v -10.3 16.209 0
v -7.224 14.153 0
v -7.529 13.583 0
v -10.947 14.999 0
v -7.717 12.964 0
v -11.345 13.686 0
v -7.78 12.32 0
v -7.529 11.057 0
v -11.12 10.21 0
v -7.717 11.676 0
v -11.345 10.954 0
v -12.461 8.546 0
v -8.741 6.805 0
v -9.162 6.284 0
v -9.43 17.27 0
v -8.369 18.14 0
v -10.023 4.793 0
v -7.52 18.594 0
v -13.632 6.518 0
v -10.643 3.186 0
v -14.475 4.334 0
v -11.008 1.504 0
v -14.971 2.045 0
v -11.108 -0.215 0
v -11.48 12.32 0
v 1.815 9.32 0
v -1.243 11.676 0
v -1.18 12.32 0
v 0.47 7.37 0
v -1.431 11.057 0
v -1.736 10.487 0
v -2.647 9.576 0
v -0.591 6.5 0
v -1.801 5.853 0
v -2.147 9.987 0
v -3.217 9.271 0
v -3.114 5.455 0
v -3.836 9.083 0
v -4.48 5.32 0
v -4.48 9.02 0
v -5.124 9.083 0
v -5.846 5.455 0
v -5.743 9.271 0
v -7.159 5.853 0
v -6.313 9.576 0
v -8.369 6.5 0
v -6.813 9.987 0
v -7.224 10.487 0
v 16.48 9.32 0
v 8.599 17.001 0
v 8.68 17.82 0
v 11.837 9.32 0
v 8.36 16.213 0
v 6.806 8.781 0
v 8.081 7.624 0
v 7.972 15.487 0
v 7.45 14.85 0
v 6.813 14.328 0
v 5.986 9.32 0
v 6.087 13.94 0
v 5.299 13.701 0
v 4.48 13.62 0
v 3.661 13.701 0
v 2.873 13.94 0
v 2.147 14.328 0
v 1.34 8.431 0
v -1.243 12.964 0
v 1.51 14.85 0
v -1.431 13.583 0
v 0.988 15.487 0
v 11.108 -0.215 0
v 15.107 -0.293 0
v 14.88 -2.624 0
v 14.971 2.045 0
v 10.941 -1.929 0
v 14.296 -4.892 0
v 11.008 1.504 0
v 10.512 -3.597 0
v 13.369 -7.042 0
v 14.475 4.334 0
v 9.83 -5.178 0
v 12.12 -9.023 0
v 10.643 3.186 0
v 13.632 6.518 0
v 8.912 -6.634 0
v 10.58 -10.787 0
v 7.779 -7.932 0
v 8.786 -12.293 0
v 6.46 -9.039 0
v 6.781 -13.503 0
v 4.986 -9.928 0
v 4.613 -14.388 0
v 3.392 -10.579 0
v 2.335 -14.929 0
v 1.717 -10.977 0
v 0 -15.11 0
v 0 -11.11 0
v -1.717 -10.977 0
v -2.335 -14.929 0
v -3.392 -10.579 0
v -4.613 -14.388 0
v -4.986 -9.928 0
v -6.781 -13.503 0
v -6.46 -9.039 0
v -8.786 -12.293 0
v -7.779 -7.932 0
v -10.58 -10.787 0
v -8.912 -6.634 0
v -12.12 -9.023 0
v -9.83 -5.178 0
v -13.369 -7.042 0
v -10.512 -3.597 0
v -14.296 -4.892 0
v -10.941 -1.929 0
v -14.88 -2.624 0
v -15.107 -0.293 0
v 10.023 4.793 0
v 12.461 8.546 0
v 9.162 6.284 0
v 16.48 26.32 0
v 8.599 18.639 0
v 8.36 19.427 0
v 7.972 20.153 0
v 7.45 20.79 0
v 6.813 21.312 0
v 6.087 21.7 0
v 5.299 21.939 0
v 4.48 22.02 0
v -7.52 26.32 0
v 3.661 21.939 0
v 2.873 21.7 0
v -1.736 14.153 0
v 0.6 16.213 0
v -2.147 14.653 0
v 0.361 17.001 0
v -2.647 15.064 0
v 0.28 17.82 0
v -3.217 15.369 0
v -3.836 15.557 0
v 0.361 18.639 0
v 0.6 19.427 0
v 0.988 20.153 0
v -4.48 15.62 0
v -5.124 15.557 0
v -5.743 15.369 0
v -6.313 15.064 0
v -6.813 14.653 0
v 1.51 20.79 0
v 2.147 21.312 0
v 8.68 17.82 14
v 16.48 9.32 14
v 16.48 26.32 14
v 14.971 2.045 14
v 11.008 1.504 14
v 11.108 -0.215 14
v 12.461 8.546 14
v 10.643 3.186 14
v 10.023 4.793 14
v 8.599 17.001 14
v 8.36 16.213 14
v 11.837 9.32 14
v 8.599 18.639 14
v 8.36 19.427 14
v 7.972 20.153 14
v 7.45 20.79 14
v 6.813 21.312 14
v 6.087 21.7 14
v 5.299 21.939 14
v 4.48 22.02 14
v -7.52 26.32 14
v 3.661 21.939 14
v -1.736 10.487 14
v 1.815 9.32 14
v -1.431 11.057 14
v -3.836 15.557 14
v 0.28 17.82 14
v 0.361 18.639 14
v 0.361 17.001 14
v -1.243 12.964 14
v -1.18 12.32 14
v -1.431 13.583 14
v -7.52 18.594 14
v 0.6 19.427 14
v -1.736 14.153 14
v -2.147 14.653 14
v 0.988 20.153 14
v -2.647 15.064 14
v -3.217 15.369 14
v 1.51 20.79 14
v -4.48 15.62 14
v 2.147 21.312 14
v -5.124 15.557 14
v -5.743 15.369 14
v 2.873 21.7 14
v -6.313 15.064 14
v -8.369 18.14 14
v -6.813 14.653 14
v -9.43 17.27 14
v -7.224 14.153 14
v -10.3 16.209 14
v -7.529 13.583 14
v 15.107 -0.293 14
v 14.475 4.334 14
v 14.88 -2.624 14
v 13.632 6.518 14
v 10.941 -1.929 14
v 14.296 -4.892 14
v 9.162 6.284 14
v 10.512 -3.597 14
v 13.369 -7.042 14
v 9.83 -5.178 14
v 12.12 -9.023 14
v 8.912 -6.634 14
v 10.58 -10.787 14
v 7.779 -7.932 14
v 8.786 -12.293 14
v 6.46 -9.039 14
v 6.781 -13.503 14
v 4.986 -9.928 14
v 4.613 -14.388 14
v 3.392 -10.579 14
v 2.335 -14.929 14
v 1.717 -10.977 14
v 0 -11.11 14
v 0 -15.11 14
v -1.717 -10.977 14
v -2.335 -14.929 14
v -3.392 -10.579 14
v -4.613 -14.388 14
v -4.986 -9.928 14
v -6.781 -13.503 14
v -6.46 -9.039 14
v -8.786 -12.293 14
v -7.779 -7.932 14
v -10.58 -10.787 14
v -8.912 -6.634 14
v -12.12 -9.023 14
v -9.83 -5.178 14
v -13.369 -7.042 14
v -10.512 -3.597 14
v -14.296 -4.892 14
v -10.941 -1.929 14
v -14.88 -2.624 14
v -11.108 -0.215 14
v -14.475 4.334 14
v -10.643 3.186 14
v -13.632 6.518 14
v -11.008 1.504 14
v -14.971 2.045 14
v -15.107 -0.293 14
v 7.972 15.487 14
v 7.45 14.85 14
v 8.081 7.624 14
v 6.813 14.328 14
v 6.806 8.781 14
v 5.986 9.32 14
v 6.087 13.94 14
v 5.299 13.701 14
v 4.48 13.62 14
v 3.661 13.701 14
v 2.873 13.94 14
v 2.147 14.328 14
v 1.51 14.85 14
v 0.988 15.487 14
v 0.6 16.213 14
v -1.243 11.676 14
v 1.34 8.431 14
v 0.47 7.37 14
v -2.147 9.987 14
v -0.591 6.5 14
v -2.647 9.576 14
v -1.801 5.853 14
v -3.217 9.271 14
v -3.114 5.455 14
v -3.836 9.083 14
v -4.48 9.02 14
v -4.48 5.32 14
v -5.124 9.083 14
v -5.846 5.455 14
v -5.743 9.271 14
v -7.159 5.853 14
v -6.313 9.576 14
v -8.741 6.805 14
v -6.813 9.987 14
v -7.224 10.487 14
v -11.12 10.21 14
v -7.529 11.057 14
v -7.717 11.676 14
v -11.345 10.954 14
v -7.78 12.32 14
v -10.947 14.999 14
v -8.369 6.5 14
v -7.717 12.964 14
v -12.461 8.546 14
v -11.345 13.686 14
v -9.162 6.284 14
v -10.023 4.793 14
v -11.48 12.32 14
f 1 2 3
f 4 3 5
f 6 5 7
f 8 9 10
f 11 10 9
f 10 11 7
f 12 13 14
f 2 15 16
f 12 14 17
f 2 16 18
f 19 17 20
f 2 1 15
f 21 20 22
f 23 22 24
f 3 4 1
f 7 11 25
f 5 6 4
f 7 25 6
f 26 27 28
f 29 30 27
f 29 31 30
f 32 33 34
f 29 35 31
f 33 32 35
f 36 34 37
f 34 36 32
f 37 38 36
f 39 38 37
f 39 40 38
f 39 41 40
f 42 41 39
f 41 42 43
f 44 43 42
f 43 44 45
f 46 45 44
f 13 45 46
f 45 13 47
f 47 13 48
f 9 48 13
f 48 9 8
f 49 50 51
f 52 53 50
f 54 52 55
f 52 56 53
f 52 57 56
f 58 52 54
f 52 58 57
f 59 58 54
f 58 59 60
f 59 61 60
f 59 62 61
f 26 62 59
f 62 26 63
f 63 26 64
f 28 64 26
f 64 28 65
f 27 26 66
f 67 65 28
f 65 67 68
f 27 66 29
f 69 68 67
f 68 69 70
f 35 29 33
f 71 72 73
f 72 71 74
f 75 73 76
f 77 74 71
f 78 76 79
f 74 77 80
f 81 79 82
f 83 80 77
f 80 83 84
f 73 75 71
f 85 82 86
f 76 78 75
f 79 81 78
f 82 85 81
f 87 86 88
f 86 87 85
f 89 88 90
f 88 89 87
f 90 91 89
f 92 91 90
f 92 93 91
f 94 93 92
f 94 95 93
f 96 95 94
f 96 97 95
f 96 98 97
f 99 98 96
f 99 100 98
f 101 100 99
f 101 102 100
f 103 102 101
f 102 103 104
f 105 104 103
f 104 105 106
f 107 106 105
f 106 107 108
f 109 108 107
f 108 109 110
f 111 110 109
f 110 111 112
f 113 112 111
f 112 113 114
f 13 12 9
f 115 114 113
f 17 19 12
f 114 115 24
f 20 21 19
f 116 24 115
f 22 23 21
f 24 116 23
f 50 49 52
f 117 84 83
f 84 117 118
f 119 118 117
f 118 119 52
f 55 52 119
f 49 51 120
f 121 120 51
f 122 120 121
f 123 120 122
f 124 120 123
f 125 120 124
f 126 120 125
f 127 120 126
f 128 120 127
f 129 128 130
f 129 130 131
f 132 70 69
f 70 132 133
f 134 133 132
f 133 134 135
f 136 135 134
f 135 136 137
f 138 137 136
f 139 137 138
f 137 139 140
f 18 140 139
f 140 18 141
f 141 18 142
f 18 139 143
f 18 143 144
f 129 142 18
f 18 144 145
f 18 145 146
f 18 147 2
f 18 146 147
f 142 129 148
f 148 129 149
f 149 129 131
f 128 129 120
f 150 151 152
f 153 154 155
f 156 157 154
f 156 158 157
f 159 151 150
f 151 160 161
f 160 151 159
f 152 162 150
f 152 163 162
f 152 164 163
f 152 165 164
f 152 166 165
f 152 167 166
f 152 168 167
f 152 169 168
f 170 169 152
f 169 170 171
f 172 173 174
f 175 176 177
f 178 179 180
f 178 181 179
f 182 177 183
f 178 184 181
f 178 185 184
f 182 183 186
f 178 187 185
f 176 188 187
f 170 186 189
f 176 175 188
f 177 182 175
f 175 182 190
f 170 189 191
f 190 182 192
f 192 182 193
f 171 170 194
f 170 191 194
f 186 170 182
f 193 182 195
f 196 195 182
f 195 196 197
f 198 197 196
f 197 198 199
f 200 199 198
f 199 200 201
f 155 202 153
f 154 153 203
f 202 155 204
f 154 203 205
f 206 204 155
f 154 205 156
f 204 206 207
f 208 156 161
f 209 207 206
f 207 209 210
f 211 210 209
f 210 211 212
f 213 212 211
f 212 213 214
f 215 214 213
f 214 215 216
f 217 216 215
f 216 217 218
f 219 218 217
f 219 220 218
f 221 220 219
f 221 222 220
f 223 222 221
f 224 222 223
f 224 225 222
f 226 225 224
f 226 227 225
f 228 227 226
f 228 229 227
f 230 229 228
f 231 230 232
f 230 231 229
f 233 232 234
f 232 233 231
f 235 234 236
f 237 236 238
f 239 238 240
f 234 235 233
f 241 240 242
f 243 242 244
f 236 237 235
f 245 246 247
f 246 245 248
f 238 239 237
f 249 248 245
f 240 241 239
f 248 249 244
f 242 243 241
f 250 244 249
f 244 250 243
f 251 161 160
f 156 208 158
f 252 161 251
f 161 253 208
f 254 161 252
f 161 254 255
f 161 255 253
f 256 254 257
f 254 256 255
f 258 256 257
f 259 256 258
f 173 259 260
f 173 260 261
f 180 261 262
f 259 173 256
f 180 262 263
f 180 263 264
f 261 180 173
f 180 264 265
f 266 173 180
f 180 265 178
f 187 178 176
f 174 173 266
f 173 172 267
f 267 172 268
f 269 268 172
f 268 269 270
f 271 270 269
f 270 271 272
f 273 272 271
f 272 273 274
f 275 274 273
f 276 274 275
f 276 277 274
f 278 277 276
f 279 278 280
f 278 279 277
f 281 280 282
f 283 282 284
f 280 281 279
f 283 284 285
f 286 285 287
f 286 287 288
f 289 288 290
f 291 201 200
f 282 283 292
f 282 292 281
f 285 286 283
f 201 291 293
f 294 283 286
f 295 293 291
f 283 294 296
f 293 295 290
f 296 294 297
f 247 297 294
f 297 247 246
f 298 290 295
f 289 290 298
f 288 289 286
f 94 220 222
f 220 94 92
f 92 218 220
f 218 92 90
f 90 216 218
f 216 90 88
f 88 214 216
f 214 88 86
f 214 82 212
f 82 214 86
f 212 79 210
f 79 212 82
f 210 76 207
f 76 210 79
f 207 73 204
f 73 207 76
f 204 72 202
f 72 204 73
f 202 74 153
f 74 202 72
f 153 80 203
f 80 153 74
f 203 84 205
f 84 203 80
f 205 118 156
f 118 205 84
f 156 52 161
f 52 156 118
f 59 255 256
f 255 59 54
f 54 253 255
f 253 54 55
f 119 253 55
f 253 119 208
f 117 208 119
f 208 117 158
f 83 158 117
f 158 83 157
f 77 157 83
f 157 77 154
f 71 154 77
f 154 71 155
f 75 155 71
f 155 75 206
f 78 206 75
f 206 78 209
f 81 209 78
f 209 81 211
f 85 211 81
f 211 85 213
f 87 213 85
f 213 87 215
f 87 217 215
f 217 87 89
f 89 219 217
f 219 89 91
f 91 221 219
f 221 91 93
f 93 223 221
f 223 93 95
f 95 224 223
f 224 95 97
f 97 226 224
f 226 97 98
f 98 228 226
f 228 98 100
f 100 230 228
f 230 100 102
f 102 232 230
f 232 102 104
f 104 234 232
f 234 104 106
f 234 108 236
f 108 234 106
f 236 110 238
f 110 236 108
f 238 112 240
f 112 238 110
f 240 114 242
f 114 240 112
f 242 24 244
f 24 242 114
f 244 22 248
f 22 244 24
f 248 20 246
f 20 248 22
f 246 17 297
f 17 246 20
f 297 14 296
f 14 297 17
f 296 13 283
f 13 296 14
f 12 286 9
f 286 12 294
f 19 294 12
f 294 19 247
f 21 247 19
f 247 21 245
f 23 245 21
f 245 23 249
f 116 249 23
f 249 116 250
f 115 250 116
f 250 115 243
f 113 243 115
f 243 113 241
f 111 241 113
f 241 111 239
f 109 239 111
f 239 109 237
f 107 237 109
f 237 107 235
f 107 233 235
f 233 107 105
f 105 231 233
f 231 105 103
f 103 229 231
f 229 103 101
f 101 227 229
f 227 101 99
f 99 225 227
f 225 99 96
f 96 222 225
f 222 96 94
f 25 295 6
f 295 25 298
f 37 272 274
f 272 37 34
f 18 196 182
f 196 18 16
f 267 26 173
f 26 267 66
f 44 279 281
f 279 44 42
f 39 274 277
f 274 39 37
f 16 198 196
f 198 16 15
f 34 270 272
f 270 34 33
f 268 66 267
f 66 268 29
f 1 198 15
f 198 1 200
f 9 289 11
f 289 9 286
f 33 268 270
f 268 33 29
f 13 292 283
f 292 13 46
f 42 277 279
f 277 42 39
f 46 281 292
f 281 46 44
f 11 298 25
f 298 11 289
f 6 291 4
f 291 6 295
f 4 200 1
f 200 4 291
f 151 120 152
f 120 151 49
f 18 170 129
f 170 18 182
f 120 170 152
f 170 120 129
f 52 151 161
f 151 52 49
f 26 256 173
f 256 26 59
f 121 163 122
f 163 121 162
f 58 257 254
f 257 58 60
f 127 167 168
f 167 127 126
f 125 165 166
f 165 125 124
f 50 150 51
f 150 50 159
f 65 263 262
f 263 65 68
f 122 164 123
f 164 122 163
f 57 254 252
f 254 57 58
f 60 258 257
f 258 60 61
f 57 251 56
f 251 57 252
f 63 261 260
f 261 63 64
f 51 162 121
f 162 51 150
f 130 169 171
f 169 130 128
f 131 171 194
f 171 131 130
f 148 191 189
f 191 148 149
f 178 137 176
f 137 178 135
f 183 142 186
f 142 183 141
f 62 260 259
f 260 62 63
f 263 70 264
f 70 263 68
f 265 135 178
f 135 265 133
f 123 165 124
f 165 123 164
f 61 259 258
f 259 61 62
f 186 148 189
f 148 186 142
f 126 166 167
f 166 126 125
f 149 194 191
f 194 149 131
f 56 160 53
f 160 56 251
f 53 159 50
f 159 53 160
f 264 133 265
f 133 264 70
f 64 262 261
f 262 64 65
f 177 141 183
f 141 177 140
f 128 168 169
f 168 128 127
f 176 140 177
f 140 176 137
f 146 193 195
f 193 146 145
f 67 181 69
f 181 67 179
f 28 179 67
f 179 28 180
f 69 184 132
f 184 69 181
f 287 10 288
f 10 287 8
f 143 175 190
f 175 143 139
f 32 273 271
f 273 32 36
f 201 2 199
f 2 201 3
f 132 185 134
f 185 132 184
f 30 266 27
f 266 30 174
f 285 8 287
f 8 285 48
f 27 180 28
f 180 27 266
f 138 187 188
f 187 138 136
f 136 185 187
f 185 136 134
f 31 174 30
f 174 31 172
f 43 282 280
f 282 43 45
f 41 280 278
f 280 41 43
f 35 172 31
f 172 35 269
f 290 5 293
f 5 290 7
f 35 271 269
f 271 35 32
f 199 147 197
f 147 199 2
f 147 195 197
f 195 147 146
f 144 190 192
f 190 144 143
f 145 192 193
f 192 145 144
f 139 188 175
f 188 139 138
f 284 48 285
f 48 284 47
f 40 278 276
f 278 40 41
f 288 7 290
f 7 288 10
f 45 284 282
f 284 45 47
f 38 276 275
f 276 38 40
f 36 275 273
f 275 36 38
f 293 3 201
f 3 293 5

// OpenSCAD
$fn = 32;

// ----------------------------------------------------------------------
// Pipe clamp: 30.22 mm ring, 4 mm wall, 14 mm wide
// ----------------------------------------------------------------------

// --- parameters (mm) ---
outer_r = 15.11;          // clamp outside radius
inner_r = 11.11;          // pipe bore radius
band = 4;                 // band thickness
clamp_w = 14;             // clamp width
opening = 40;             // opening angle between the ends
lug_w = 24;               // lug width
lug_len = 17;             // lug length
bolt_d = 8.4;             // bolt hole
knuckle_d = 14;           // hinge knuckle diameter
pin_d = 6.6;              // hinge pin hole

clamp_profile = [[-5.168, 14.199], [-7.3, 13.23], [-9.256, 11.943], [-10.991, 10.369], [-12.461, 8.546], [-13.632, 6.518], [-14.475, 4.334], [-14.971, 2.045], [-15.107, -0.293], [-14.88, -2.624], [-14.296, -4.892], [-13.369, -7.042], [-12.12, -9.023], [-10.58, -10.787], [-8.786, -12.293], [-6.781, -13.503], [-4.613, -14.388], [-2.335, -14.929], [0, -15.11], [2.335, -14.929], [4.613, -14.388], [6.781, -13.503], [8.786, -12.293], [10.58, -10.787], [12.12, -9.023], [13.369, -7.042], [14.296, -4.892], [14.88, -2.624], [15.107, -0.293], [14.971, 2.045], [14.475, 4.334], [13.632, 6.518], [12.461, 8.546], [10.991, 10.369], [9.256, 11.943], [7.3, 13.23], [5.168, 14.199], [3.8, 10.44], [5.367, 9.727], [6.806, 8.781], [8.081, 7.624], [9.162, 6.284], [10.023, 4.793], [10.643, 3.186], [11.008, 1.504], [11.108, -0.215], [10.941, -1.929], [10.512, -3.597], [9.83, -5.178], [8.912, -6.634], [7.779, -7.932], [6.46, -9.039], [4.986, -9.928], [3.392, -10.579], [1.717, -10.977], [0, -11.11], [-1.717, -10.977], [-3.392, -10.579], [-4.986, -9.928], [-6.46, -9.039], [-7.779, -7.932], [-8.912, -6.634], [-9.83, -5.178], [-10.512, -3.597], [-10.941, -1.929], [-11.108, -0.215], [-11.008, 1.504], [-10.643, 3.186], [-10.023, 4.793], [-9.162, 6.284], [-8.081, 7.624], [-6.806, 8.781], [-5.367, 9.727], [-3.8, 10.44]];

difference() {
  union() {
    linear_extrude(height = clamp_w) polygon(clamp_profile);
    /* hinge knuckle, sunk 2 mm into the band end */
    translate([-4.48, 12.32, 0]) cylinder(h = clamp_w, d = knuckle_d);
    /* bolt lug on the other end */
    translate([-7.52, 9.32, 0]) cube([lug_w, 17, clamp_w]);
  }
  translate([4.48, 17.82, -2.5]) cylinder(h = clamp_w + 5, d = bolt_d);
  translate([-4.48, 12.32, -2.5]) cylinder(h = clamp_w + 5, d = pin_d);
}
